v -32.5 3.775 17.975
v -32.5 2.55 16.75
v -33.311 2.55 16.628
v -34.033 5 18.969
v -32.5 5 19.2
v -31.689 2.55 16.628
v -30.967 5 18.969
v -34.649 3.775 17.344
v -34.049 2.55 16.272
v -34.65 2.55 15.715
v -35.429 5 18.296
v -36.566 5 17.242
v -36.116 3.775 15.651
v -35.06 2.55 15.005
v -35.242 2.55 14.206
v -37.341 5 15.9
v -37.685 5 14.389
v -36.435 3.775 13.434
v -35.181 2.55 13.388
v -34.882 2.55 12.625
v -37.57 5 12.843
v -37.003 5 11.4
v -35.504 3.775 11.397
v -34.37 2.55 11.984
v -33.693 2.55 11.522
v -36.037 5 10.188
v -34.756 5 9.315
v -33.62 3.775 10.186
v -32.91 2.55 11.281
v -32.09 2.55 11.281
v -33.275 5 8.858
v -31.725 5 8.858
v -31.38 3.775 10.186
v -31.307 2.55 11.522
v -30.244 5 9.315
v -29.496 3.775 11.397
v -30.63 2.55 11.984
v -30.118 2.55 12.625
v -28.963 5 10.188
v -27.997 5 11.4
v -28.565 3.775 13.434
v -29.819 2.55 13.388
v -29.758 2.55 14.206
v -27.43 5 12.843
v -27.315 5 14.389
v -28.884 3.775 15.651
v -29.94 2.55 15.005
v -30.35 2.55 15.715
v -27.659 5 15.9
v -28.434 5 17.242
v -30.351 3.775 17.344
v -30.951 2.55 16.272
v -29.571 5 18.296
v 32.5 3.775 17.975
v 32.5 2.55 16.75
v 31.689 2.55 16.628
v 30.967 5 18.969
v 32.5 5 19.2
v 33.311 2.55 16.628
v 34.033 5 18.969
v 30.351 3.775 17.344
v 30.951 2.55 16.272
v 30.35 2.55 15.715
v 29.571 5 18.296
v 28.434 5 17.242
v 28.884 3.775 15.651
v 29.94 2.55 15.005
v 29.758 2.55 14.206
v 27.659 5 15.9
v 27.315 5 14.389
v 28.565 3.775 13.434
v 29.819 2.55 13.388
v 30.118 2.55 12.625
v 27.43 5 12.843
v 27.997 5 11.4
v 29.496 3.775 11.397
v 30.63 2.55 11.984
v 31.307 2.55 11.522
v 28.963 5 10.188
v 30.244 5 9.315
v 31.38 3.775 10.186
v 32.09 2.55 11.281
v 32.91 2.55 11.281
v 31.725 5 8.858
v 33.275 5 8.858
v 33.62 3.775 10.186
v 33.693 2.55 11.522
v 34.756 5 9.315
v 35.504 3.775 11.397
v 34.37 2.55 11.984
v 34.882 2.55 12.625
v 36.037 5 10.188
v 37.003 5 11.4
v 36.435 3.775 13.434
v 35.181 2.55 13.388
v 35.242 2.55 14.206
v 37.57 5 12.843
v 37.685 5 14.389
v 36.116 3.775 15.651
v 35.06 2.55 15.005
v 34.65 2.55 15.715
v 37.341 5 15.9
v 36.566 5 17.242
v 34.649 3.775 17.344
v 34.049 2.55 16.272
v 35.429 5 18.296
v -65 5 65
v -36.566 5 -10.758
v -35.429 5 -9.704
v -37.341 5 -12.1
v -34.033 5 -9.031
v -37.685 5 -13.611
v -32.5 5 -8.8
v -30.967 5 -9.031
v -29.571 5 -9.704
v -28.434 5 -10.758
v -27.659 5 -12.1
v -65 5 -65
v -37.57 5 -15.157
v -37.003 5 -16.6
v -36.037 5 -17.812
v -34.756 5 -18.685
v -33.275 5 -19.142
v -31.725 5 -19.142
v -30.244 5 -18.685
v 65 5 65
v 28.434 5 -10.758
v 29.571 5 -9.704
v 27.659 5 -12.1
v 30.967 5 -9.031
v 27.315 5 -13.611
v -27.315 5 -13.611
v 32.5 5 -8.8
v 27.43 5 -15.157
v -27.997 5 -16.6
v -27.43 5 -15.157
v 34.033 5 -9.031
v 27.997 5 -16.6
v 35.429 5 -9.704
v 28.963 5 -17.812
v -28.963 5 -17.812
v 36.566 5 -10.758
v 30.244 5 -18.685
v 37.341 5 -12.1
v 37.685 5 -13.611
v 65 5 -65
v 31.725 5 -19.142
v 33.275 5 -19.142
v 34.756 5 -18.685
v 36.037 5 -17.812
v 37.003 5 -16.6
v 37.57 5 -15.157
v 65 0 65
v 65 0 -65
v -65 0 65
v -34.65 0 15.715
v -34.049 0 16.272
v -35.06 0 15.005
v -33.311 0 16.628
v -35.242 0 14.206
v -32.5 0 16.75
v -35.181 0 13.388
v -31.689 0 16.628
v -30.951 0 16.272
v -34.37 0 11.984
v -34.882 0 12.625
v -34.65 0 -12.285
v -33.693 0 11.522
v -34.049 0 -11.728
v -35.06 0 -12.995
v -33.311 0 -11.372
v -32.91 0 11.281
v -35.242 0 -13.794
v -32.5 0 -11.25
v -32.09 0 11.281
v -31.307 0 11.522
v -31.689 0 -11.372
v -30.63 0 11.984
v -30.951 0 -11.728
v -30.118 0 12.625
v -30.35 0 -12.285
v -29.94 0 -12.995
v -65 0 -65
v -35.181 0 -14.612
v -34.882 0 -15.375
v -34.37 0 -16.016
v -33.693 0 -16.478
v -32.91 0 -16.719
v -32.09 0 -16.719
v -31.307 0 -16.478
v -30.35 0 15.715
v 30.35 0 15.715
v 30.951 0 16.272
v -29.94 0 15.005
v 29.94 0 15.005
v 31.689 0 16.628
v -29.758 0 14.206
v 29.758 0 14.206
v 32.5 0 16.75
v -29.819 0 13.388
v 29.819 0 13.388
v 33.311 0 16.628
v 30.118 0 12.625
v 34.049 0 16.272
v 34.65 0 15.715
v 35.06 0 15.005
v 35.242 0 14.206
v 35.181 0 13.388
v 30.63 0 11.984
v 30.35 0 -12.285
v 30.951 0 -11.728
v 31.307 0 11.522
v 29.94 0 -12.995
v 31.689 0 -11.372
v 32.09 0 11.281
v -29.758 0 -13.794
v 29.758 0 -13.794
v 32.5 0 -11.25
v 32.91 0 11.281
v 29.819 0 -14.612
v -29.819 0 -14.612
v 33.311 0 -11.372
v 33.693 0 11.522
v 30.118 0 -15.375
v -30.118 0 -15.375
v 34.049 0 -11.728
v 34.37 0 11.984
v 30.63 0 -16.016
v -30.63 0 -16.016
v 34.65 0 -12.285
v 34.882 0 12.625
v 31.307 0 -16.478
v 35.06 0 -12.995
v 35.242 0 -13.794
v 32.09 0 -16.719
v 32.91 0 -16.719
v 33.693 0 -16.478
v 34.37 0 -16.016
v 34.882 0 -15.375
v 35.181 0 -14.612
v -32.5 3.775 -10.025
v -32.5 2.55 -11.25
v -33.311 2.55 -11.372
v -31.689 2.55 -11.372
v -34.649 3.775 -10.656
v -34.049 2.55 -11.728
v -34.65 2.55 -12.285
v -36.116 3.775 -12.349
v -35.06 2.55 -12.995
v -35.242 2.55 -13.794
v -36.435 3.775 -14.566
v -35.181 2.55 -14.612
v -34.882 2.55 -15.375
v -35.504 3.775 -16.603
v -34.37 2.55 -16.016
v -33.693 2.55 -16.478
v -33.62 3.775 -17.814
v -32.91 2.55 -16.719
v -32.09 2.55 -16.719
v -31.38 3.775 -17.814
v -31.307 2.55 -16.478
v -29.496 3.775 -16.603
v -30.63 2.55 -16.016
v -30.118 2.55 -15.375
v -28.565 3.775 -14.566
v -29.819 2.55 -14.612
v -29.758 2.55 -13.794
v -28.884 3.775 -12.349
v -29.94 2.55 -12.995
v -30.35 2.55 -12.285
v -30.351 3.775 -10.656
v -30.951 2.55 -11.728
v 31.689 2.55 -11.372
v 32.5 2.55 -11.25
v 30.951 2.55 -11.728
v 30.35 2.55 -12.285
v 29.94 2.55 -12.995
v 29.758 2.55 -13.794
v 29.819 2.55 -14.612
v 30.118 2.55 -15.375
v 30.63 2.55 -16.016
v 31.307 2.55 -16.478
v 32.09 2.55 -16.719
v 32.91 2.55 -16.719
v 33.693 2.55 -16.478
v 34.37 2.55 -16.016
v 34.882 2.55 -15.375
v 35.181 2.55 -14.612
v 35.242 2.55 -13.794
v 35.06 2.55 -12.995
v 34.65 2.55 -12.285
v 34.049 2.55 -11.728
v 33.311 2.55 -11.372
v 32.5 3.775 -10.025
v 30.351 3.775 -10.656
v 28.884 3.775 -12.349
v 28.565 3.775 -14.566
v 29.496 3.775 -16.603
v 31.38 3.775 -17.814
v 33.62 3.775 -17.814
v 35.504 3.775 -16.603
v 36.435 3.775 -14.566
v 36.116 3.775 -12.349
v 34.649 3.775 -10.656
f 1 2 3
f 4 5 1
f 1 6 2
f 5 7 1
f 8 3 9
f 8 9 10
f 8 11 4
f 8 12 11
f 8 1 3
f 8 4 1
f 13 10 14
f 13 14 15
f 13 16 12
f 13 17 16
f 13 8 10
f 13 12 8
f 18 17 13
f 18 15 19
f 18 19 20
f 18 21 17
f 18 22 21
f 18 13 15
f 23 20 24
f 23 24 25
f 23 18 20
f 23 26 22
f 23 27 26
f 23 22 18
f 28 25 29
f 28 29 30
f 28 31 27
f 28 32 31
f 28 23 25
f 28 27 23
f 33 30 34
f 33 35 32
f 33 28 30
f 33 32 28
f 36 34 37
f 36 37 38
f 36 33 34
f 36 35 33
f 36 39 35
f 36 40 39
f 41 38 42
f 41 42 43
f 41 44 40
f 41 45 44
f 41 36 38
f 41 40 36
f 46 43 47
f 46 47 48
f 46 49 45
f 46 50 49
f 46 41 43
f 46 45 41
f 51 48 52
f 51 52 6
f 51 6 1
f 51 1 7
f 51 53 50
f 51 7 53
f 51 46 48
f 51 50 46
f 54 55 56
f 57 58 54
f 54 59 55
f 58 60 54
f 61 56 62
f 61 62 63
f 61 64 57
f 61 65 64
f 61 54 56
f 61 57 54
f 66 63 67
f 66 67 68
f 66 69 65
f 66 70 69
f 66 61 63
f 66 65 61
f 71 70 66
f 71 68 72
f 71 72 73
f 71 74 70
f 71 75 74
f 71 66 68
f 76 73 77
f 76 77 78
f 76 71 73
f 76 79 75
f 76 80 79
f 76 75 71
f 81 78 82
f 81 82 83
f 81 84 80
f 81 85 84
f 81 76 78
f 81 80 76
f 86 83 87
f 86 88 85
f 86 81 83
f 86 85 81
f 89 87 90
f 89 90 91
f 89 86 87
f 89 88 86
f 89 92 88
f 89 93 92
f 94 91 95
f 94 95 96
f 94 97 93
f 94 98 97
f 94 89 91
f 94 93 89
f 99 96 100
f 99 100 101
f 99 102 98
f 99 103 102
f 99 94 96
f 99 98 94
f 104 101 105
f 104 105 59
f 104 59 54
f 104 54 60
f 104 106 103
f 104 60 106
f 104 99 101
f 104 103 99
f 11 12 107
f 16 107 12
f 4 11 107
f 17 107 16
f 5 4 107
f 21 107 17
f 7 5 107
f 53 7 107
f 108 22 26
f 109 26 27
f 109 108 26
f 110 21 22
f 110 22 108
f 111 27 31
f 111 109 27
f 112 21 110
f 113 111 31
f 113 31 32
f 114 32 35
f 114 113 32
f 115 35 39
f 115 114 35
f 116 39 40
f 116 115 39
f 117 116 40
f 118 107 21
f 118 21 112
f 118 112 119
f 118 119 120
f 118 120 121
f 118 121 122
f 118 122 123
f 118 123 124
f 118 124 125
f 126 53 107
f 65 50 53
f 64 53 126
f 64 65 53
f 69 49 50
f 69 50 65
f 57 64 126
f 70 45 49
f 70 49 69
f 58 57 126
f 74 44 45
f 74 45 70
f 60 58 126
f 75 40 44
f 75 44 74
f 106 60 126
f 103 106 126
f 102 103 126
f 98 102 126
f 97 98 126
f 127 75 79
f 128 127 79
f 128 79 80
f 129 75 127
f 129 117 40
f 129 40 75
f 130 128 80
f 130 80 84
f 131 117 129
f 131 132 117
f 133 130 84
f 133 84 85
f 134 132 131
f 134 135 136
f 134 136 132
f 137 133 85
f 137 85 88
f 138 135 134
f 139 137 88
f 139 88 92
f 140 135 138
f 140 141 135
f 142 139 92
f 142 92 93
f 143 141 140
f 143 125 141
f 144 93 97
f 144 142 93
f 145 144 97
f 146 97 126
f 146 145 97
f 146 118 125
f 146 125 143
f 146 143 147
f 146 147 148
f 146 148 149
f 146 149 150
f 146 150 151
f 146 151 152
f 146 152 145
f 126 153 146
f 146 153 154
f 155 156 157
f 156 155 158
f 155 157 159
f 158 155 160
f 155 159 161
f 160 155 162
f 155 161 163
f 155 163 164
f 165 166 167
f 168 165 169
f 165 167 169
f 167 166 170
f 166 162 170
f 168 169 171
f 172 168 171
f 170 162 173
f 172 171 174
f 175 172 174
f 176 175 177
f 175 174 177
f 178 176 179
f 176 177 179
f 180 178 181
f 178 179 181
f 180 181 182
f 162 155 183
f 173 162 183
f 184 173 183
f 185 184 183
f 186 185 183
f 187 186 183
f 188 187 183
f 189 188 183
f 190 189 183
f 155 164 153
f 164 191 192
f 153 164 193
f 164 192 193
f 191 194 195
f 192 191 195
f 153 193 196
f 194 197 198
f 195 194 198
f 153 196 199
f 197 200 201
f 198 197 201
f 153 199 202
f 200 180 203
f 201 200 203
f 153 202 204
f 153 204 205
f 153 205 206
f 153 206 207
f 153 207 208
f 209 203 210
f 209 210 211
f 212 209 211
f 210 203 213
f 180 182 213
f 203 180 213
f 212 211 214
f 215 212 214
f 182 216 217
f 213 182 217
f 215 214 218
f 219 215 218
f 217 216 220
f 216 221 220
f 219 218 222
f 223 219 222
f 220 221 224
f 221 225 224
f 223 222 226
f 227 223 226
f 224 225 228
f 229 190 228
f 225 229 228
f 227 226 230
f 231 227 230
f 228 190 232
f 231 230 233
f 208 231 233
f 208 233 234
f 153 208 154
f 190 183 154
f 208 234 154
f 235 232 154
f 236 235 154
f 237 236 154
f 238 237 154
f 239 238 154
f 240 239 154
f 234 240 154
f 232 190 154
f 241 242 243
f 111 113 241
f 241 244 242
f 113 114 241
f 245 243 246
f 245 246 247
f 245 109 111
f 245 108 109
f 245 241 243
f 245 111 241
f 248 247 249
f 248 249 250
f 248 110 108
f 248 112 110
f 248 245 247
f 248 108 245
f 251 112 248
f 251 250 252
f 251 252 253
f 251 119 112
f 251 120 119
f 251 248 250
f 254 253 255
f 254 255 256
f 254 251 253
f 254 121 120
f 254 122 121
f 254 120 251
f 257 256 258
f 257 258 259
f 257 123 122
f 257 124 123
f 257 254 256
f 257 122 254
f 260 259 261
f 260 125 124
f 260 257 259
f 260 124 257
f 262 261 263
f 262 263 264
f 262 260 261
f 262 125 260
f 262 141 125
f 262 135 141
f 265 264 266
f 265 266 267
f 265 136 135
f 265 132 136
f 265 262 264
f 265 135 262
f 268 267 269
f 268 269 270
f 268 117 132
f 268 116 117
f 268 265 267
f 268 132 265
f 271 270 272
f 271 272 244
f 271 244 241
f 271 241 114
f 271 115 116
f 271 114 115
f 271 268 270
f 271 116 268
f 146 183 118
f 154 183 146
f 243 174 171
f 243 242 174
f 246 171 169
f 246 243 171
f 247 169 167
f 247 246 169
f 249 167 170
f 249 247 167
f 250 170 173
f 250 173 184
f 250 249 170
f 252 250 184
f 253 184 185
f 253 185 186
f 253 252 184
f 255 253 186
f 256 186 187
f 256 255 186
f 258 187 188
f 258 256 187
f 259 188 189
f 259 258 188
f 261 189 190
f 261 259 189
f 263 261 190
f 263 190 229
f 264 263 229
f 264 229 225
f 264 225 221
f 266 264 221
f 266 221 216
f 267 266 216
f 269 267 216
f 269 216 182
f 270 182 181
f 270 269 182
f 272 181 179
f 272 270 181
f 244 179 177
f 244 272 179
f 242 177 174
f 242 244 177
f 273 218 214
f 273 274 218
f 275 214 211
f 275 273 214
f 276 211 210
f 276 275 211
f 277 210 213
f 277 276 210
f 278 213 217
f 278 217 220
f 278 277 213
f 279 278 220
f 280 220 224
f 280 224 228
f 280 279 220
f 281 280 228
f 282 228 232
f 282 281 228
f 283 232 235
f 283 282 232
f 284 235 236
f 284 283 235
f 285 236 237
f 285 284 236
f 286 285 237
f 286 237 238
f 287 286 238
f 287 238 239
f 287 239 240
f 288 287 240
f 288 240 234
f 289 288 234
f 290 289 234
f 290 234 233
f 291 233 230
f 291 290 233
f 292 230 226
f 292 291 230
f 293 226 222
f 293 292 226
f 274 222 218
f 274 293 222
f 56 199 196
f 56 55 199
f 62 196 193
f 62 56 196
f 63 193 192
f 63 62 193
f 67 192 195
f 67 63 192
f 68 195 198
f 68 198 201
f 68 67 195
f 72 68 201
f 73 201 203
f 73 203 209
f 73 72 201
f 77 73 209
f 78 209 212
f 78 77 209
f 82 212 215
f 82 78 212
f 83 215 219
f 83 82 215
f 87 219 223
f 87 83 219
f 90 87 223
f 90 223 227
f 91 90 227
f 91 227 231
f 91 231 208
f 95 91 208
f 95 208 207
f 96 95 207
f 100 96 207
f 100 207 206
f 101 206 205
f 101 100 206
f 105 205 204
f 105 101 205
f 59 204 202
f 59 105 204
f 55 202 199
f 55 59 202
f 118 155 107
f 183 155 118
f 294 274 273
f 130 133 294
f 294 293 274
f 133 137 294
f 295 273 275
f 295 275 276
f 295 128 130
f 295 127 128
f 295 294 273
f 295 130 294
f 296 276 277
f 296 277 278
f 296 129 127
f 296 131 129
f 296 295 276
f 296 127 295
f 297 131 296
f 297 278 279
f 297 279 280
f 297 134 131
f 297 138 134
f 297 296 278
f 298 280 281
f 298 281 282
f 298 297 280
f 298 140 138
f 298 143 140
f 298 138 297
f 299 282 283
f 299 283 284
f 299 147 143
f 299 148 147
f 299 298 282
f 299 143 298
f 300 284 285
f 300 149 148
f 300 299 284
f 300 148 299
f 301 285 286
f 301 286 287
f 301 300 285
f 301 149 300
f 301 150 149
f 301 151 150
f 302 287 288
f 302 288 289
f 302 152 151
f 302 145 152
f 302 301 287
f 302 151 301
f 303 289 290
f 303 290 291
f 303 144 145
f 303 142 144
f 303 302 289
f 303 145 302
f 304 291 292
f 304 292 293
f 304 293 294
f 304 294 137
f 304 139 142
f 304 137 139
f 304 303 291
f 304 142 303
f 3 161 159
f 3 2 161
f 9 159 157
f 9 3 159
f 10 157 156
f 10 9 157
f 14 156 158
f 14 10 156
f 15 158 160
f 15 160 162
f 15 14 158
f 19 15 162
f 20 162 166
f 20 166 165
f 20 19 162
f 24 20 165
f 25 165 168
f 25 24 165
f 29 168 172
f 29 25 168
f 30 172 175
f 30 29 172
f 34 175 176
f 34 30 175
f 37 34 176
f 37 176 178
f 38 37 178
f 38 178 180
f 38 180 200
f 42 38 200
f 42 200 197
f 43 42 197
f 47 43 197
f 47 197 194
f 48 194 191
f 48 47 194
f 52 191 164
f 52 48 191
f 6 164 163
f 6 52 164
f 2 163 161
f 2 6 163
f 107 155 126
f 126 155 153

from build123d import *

# Parameters (mm, degrees)
SCHIZZO1_W                            = 130
SCHIZZO1_H                            = 130
ESTRUSIONE_ESTRUSIONE1_DEPTH          = 5
FORO_SVASATO_PER_VITE_M5_1_AT_2_COUNT = 2
FORO_SVASATO_PER_VITE_M5_1_AT_2_PITCH = 65
FORO_SVASATO_PER_VITE_M5_1_AT_3_COUNT = 2
FORO_SVASATO_PER_VITE_M5_1_AT_3_PITCH = 70.774289117
FORO_SVASATO_PER_VITE_M5_1_AT_4_COUNT = 2
FORO_SVASATO_PER_VITE_M5_1_AT_4_PITCH = 28


with BuildPart() as part:
    # Schizzo1 → Estrusione-Estrusione1 (new body)
    with BuildSketch(Plane(origin=(0, 0, 0), x_dir=(1, 0, 0), z_dir=(0, 1, 0))):
        Rectangle(SCHIZZO1_W, SCHIZZO1_H)
    extrude(amount=ESTRUSIONE_ESTRUSIONE1_DEPTH)

    # Schizzo4 → Foro svasato per Vite M5-1 (revolve, cut)
    with BuildSketch(Plane(origin=(-32.5, 5, -14), x_dir=(0, 0, 1), z_dir=(1, 0, 0))):
        Polygon((0, 0), (0, 5), (2.75, 5), (2.75, 2.45), (5.2, 0), align=None)
    foro_svasato_per_vite_m5_1 = revolve(axis=Axis((-32.5, 11.35, -14), (0, -1, 0)), mode=Mode.SUBTRACT)

    # Foro svasato per Vite M5-1 at 2: Foro svasato per Vite M5-1 ×2
    with Locations(*[(i * FORO_SVASATO_PER_VITE_M5_1_AT_2_PITCH, 0, 0) for i in range(1, FORO_SVASATO_PER_VITE_M5_1_AT_2_COUNT)]):
        add(foro_svasato_per_vite_m5_1, mode=Mode.SUBTRACT)

    # Foro svasato per Vite M5-1 at 3: Foro svasato per Vite M5-1 ×2
    with Locations(*[Vector(0.9184126158110061, 0, 0.39562389604166415) * (i * FORO_SVASATO_PER_VITE_M5_1_AT_3_PITCH) for i in range(1, FORO_SVASATO_PER_VITE_M5_1_AT_3_COUNT)]):
        add(foro_svasato_per_vite_m5_1, mode=Mode.SUBTRACT)

    # Foro svasato per Vite M5-1 at 4: Foro svasato per Vite M5-1 ×2
    with Locations(*[(0, 0, i * FORO_SVASATO_PER_VITE_M5_1_AT_4_PITCH) for i in range(1, FORO_SVASATO_PER_VITE_M5_1_AT_4_COUNT)]):
        add(foro_svasato_per_vite_m5_1, mode=Mode.SUBTRACT)


solid = part.part
